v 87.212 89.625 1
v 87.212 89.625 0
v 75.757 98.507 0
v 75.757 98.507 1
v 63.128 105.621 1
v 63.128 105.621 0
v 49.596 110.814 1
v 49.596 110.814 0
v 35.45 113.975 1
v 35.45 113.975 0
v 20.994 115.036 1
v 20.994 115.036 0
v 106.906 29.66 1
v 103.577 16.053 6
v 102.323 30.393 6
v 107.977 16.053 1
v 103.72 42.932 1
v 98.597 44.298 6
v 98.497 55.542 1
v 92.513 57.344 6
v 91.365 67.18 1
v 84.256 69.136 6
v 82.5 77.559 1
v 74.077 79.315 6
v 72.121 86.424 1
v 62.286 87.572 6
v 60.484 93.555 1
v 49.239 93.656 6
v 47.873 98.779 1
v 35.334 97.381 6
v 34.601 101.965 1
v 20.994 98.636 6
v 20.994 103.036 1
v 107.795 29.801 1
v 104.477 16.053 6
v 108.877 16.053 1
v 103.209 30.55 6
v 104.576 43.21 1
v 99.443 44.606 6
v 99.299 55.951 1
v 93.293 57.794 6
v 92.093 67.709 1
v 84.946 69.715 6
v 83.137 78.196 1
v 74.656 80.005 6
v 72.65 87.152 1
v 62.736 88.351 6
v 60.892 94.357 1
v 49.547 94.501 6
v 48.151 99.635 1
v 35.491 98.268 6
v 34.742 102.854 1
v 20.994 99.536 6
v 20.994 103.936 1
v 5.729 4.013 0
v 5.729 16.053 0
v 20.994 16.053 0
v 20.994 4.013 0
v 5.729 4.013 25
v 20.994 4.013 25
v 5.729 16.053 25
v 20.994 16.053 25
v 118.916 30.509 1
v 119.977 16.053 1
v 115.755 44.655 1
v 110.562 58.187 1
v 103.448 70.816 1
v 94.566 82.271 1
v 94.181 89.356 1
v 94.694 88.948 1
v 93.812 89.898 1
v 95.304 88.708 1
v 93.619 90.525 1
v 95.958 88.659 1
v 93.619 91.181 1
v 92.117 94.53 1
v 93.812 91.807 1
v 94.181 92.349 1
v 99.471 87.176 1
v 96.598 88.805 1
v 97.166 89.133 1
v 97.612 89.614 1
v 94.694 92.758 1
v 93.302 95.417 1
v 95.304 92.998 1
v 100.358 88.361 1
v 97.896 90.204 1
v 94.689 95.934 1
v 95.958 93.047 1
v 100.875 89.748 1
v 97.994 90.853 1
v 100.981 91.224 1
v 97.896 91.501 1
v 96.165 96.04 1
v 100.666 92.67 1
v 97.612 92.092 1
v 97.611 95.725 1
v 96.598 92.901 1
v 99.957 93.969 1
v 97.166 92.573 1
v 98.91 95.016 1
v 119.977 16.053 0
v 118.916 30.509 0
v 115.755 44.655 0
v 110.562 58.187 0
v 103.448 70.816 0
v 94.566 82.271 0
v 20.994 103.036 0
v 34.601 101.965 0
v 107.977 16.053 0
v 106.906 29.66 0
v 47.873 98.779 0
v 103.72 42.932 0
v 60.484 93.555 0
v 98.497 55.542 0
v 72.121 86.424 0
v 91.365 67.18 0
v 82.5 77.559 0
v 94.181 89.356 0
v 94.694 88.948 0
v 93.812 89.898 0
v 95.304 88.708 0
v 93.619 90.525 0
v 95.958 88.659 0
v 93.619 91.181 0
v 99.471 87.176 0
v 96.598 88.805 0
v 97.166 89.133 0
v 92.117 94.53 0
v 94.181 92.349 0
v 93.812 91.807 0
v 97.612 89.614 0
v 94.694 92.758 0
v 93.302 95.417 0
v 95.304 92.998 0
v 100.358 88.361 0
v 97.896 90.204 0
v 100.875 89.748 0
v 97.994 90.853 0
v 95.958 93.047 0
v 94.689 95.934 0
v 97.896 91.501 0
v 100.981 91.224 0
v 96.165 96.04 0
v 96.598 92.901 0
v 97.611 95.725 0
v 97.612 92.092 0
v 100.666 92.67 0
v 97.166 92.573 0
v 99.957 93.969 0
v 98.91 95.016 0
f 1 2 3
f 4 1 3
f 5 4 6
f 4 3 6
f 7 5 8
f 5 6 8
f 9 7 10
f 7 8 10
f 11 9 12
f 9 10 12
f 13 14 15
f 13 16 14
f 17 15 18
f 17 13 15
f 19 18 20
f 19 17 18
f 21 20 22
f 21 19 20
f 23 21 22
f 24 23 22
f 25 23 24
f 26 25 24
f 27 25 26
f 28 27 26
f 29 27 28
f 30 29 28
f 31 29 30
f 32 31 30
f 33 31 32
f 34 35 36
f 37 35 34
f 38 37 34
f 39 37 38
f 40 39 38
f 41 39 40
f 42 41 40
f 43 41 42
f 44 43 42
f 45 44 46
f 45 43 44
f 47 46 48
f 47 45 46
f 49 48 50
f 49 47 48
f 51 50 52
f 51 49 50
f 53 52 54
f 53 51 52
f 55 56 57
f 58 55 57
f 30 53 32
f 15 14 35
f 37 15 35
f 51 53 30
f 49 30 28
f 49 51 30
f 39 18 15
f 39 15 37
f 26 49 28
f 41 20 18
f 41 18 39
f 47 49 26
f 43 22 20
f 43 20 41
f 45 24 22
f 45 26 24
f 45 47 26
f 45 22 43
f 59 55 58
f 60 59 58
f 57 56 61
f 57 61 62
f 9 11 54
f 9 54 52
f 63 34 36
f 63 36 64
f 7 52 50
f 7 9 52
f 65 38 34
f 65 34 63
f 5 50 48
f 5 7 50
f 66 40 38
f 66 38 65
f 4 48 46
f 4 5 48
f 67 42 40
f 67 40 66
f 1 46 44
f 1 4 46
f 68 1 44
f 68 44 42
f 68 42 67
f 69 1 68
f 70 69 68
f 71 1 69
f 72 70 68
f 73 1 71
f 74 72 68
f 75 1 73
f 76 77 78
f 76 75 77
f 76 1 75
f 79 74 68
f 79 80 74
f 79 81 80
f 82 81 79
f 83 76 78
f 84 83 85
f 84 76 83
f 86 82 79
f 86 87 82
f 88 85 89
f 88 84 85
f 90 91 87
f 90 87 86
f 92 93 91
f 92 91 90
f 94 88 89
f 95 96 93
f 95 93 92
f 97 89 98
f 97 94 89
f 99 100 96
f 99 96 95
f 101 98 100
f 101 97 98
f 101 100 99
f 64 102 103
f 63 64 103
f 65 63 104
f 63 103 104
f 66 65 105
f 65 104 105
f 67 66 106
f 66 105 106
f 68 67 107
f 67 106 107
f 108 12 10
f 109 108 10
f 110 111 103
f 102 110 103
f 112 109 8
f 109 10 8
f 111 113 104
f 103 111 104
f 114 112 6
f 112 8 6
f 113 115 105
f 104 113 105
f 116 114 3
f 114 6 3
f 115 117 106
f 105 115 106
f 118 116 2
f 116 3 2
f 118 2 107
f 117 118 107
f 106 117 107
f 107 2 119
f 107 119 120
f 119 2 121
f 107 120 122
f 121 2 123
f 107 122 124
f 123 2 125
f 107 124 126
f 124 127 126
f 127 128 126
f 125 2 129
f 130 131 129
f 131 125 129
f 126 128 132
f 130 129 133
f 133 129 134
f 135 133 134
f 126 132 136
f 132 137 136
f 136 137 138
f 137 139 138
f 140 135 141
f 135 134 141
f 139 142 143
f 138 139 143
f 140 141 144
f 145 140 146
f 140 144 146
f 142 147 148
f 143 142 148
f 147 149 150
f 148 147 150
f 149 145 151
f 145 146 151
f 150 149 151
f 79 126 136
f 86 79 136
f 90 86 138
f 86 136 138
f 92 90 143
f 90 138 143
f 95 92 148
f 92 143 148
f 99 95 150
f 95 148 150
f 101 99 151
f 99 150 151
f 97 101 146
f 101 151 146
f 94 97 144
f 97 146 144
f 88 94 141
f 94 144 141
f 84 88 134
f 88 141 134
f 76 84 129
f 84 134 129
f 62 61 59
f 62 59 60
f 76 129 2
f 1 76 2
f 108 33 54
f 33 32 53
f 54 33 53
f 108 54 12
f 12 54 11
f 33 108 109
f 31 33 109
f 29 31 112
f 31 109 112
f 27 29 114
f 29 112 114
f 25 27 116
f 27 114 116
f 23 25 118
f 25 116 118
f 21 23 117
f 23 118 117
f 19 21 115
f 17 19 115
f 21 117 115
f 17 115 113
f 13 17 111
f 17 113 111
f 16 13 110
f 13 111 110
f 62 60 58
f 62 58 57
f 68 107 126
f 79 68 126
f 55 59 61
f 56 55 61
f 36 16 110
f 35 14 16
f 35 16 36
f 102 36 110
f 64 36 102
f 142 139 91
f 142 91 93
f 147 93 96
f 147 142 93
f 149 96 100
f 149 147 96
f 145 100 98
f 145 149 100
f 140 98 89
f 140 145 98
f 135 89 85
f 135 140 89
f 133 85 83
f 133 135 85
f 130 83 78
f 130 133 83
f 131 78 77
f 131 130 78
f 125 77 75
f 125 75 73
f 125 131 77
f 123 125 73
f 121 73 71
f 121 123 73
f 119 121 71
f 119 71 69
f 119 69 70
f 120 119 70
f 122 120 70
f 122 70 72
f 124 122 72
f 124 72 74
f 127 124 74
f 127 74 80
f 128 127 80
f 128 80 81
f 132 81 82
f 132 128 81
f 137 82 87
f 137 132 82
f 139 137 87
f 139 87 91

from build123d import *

# Parameters (mm, degrees)
F0_R     = 2.2
F1_DEPTH = 1
F0_W     = 15.2652747326
F0_H     = 12.0394033708
F3_DEPTH = 25
F4_ANGLE = 90


# Not quite as in the source:
# - a feature names something its author has since deleted; it is built from what else it names


with BuildPart() as f1:
    # F0 (on Top) → F1 (new body)
    with BuildSketch(Plane.XY):
        with BuildLine():
            Line((94.5659986717, 82.2709264254), (99.4709712732, 87.1758990269))
            ThreePointArc((99.4709712732, 87.1758990269), (99.4709744308, 94.5298127088), (92.1170607489, 94.5298095512))
            Line((92.1170607489, 94.5298095512), (87.2120881473, 89.6248369497))
            ThreePointArc((87.2120881473, 89.6248369497), (56.4572447999, 108.4651318213), (20.9940191686, 115.0360319122))
            Line((20.9940191686, 115.0360319122), (20.9940191686, 103.0360319122))
            ThreePointArc((20.9940191686, 103.0360319122), (82.5004116823, 77.5592499604), (107.9771936341, 16.0528574467))
            Line((107.9771936341, 16.0528574467), (119.9771936341, 16.0528574467))
            ThreePointArc((119.9771936341, 16.0528574467), (113.4062935433, 51.5160830779), (94.5659986717, 82.2709264254))
        make_face()
        with Locations((95.7940191686, 90.8528574467)):
            Circle(F0_R, mode=Mode.SUBTRACT)
    extrude(amount=F1_DEPTH)

    # F2 (on face) → F4 (revolve)
    with BuildSketch(Plane.XZ.offset(-16.0528574467)):
        Polygon((108.8771936341, 1), (104.4771936341, 6), (103.5771936341, 6), (107.9771936341, 1), align=None)
    revolve(axis=Axis((20.9940191686, 16.0528574467, 12.5), (0, 0, 1)), revolution_arc=F4_ANGLE)


with BuildPart() as f3:
    # F0 (on Top) → F3 (new body)
    with BuildSketch(Plane.XY):
        with Locations((13.3613818023, 10.0331557613)):
            Rectangle(F0_W, F0_H)
    extrude(amount=F3_DEPTH)


solid = Compound([f1.part, f3.part])
